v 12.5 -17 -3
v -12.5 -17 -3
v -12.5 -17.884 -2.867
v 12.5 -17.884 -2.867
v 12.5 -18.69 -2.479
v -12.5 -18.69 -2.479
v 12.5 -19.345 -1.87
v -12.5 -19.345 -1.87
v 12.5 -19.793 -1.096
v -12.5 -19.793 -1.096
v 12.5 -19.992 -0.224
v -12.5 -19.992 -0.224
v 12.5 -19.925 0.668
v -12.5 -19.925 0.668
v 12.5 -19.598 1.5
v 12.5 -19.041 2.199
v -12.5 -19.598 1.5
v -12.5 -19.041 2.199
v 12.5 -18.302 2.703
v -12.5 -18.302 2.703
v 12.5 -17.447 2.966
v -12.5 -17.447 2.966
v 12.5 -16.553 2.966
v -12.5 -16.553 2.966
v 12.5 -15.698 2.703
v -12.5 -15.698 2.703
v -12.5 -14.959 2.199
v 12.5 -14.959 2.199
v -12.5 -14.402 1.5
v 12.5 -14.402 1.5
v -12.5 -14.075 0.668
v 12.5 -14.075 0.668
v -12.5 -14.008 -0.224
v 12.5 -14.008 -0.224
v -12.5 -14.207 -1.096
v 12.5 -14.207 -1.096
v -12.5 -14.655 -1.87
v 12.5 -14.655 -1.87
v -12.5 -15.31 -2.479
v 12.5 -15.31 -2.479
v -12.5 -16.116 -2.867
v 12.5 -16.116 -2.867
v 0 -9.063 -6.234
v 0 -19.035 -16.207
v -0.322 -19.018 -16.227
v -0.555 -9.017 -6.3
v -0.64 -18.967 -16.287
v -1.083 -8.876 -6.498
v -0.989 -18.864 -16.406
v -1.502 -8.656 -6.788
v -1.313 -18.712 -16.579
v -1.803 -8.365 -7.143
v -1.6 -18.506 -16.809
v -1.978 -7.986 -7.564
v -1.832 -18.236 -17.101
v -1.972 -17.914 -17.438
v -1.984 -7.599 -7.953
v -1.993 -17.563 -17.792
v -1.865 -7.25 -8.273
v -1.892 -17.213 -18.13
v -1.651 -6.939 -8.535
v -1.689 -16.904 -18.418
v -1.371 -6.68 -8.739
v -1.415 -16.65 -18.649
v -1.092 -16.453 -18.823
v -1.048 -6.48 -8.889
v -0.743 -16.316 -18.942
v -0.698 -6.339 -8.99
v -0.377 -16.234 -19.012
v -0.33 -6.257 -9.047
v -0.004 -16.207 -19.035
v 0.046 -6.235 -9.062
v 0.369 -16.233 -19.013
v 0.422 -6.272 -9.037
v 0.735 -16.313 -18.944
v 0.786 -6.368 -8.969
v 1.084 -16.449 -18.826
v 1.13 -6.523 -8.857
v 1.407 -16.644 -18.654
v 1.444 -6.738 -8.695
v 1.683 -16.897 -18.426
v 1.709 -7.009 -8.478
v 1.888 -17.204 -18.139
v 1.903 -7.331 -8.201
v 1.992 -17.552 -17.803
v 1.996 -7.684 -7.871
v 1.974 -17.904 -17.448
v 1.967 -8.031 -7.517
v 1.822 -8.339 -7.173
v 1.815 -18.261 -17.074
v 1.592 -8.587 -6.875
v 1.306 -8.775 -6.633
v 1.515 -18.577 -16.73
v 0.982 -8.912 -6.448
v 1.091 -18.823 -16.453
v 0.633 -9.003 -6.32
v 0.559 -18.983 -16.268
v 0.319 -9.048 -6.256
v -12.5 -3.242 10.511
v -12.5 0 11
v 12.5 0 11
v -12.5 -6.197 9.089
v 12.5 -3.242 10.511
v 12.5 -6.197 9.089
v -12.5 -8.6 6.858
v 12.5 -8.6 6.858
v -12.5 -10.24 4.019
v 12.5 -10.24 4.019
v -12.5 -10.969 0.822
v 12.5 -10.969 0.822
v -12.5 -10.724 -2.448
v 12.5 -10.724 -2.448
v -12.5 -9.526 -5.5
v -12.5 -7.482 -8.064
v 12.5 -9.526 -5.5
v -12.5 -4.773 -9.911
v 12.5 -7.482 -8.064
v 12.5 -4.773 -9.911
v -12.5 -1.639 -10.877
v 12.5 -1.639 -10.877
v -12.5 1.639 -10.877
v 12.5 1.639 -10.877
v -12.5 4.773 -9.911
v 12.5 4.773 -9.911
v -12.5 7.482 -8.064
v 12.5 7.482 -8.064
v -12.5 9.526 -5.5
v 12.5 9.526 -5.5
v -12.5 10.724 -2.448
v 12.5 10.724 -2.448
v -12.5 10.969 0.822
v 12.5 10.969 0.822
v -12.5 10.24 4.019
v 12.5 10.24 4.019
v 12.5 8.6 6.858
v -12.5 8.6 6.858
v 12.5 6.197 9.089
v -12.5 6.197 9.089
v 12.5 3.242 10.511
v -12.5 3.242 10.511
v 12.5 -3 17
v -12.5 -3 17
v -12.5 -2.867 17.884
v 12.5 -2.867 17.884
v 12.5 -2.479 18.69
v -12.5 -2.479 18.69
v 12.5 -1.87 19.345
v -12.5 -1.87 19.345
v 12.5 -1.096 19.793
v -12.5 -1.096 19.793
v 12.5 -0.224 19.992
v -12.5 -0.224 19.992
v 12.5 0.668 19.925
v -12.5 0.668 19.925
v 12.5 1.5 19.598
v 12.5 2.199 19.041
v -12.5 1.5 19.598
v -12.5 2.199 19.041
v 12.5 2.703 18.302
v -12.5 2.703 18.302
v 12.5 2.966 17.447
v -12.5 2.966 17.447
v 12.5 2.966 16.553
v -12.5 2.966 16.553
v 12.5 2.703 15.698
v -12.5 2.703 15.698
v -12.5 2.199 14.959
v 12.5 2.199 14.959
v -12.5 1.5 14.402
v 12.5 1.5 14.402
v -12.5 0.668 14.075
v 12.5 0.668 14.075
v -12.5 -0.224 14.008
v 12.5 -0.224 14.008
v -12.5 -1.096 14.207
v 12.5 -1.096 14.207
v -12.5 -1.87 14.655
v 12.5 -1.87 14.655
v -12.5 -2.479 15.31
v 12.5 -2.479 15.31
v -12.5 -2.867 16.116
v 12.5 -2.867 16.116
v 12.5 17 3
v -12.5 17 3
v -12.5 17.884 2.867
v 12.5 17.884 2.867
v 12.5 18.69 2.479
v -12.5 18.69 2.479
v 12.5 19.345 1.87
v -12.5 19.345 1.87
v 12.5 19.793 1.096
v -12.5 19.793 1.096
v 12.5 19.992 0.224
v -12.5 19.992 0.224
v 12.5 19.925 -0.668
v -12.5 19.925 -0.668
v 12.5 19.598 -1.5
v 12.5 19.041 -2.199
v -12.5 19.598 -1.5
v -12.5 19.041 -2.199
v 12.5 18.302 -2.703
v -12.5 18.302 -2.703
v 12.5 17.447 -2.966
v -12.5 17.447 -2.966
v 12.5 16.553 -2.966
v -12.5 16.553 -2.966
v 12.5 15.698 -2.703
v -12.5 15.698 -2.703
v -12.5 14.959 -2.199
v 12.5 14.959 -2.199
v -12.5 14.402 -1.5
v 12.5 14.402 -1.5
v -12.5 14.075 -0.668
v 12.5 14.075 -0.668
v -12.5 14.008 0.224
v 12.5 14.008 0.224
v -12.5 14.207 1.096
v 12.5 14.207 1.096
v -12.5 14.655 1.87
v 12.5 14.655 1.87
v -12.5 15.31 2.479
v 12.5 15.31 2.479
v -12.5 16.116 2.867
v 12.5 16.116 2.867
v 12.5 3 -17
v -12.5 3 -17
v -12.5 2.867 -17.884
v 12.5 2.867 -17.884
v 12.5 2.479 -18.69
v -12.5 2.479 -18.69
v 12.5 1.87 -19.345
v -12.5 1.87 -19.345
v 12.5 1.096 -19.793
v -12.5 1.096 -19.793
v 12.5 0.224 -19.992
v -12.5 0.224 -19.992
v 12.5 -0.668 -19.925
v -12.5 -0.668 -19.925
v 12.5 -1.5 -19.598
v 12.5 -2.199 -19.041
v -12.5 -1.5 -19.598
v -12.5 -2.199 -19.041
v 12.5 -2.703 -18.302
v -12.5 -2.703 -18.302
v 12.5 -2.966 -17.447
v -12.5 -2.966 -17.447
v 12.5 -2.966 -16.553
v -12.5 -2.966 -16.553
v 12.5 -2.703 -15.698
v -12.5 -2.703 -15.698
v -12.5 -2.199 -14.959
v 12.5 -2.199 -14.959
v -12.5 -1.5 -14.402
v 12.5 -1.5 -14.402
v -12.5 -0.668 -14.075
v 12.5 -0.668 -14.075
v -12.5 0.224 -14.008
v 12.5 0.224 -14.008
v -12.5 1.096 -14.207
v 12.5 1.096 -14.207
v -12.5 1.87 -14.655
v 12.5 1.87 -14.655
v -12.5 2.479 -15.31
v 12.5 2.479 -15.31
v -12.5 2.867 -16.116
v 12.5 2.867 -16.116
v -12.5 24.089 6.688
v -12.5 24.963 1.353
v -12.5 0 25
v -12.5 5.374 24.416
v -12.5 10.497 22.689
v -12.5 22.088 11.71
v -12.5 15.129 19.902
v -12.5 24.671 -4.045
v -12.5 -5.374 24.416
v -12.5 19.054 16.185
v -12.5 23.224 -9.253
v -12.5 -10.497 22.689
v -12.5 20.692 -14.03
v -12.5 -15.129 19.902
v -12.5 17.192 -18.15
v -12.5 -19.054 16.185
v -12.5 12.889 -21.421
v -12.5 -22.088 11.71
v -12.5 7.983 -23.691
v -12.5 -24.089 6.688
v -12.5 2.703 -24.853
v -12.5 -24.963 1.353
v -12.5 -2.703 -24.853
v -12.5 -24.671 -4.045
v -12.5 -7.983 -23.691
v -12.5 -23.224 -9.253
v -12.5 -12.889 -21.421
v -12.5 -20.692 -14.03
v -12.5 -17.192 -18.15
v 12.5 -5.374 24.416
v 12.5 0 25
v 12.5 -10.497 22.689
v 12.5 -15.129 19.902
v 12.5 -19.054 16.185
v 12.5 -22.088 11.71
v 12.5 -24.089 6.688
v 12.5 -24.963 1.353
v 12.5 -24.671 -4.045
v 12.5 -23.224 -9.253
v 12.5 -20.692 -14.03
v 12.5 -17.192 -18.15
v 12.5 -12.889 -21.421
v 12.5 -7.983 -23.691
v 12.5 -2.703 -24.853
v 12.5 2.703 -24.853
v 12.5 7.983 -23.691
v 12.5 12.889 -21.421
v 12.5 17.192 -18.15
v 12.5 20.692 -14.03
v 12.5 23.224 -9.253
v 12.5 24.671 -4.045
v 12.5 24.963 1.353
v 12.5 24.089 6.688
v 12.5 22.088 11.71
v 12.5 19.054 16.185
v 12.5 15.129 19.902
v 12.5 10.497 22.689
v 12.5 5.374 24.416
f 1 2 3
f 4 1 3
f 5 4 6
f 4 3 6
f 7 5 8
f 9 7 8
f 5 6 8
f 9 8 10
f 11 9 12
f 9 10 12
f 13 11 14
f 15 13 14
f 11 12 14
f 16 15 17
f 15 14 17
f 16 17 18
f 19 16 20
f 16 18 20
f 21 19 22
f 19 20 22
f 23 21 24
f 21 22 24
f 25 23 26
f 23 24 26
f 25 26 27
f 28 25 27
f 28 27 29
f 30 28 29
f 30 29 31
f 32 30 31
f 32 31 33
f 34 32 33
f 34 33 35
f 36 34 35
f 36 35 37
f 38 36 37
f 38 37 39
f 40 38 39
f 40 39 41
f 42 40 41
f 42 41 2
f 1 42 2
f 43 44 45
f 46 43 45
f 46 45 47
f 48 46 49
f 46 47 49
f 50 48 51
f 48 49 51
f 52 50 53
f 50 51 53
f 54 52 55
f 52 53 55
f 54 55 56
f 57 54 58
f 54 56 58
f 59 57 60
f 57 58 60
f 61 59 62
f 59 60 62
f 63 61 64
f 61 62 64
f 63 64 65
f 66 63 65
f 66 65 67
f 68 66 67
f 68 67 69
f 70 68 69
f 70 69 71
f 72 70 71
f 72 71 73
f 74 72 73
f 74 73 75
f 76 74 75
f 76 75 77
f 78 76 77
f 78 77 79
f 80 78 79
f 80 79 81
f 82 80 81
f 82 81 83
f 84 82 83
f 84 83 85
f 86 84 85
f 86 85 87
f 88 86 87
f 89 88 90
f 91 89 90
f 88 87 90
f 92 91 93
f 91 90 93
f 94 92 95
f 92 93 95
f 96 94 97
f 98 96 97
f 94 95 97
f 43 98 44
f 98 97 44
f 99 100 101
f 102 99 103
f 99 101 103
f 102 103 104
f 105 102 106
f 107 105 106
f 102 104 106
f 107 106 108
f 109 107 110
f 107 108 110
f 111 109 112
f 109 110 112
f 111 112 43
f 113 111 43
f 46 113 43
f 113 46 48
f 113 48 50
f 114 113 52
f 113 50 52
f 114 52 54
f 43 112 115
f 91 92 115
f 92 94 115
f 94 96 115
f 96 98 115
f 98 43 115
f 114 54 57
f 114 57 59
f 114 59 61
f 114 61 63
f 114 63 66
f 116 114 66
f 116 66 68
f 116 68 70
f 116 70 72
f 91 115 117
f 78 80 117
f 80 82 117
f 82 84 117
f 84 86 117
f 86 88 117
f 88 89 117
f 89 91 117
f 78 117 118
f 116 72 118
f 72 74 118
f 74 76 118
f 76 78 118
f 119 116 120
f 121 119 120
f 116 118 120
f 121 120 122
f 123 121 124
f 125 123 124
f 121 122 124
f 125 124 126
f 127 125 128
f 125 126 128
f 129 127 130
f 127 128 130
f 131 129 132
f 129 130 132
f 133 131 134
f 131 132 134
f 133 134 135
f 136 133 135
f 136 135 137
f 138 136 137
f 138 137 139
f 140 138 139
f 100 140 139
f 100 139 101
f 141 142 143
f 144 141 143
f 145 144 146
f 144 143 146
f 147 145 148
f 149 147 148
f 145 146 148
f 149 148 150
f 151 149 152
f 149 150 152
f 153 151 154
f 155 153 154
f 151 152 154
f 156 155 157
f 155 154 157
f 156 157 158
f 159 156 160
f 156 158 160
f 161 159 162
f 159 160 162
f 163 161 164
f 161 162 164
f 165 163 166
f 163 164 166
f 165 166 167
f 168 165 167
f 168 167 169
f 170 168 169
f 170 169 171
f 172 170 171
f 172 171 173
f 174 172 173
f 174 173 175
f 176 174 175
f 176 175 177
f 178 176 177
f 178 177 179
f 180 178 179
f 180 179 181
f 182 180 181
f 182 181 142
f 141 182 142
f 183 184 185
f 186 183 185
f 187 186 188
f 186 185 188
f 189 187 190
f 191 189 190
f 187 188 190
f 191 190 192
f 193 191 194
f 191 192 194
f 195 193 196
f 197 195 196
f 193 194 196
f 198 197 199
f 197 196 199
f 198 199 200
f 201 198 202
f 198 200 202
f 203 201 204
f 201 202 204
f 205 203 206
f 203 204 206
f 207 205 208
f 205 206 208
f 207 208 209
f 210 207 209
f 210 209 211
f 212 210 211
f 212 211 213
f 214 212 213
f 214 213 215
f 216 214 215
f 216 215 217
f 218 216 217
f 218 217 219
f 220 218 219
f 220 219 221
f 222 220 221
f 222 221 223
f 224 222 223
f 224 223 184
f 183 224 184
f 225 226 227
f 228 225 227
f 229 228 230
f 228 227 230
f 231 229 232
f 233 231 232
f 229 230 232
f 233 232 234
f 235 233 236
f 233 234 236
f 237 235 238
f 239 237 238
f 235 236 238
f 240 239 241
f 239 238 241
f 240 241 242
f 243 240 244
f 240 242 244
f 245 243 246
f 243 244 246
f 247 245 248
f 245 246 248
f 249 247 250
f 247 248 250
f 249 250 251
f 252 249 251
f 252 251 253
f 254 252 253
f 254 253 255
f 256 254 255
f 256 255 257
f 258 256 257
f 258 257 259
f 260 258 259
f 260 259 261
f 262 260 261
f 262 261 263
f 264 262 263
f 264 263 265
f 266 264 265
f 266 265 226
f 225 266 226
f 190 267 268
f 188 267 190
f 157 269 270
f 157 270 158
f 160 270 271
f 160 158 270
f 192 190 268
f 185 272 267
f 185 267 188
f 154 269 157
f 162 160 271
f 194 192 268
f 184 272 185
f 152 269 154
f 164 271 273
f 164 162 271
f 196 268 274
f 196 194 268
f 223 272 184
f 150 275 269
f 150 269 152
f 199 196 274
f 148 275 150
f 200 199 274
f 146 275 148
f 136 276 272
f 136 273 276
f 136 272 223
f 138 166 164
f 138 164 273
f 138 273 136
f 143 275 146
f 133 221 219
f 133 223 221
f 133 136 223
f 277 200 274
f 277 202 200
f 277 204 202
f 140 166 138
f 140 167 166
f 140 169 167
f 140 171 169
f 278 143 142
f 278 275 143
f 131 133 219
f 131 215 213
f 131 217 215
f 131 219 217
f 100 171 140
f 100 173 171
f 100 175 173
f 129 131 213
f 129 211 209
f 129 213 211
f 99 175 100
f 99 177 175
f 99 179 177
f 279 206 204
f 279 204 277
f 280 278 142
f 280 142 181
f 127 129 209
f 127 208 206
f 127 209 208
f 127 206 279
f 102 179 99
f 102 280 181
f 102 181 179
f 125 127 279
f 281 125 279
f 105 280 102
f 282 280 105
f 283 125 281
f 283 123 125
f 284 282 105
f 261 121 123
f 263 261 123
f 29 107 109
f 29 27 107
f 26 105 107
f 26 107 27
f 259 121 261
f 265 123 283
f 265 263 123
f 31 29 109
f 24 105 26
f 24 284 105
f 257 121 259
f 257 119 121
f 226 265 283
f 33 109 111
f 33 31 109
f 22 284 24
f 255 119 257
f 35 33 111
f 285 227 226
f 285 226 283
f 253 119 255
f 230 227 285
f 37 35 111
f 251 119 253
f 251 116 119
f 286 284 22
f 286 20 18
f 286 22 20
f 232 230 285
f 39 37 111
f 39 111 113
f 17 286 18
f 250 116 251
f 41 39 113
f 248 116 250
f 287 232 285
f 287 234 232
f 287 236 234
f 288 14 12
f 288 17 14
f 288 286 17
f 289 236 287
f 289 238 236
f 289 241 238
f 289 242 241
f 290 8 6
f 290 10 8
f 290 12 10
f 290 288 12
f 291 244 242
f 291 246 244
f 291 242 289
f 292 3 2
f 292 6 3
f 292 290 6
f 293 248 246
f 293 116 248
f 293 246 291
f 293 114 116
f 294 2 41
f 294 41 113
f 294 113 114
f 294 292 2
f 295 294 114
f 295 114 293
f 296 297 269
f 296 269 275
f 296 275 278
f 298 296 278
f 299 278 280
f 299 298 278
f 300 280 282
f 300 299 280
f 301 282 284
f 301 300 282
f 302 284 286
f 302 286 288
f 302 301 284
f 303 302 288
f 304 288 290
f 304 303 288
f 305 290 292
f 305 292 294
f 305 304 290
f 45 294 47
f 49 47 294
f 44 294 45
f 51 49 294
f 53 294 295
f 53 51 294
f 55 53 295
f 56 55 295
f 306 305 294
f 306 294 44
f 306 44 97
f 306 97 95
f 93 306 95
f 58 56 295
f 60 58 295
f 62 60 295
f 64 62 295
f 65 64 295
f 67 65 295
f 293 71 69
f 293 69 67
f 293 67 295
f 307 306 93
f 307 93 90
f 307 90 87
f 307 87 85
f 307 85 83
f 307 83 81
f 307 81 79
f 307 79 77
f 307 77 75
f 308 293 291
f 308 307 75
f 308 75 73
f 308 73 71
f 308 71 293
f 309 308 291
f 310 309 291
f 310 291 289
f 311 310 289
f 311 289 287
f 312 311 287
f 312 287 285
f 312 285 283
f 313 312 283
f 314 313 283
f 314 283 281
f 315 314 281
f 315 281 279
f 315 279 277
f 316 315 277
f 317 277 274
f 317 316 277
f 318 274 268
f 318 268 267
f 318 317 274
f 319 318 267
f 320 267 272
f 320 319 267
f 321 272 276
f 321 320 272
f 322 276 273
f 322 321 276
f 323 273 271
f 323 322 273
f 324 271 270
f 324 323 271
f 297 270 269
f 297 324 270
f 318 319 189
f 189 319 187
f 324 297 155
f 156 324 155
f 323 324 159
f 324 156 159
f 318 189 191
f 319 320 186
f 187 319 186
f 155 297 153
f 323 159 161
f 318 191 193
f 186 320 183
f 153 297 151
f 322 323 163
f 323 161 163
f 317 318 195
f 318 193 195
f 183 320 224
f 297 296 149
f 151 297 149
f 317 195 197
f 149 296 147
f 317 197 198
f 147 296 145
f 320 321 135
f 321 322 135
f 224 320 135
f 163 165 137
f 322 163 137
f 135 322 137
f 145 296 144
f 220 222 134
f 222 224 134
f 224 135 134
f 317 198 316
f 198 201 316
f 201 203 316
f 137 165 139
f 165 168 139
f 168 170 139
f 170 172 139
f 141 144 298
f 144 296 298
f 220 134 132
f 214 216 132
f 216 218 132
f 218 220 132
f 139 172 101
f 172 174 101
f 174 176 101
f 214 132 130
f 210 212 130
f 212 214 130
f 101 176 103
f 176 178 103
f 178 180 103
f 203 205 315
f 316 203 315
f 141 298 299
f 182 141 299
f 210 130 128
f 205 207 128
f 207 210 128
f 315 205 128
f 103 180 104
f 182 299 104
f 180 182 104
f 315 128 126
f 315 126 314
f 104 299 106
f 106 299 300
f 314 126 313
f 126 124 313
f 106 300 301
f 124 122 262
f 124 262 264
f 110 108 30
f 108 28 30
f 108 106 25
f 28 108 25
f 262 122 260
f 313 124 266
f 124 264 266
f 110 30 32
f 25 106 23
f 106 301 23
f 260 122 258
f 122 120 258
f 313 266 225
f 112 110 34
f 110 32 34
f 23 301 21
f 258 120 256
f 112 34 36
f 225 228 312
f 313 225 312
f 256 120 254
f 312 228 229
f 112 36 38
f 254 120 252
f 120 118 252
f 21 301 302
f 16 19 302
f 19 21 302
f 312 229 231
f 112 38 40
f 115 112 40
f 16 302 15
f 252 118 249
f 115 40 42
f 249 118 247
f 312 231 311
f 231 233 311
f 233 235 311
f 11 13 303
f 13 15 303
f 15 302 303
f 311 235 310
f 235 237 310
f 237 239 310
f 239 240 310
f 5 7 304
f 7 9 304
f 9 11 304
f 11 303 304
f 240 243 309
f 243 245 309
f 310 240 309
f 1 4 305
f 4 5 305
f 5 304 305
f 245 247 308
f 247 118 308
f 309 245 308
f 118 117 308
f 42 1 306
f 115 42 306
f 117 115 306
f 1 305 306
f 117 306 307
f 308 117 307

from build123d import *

# Parameters (mm, degrees)
SKETCH1_W                  = 25
SKETCH1_H                  = 14
F_6_0MM_DOWEL_HOLE1_D      = 6
CIRPATTERN1_COUNT          = 4
F_4_0MM_DOWEL_HOLE1_REACH  = 63.636
F_4_0MM_DOWEL_HOLE1_BORE_R = 2


with BuildPart() as part:
    # Sketch1 → Revolve2 (revolve)
    with BuildSketch(Plane(origin=(0, 0, 0), x_dir=(1, 0, 0), z_dir=(0, 1, 0)), mode=Mode.PRIVATE) as revolve2_sk:
        with Locations((0, 18)):
            Rectangle(SKETCH1_W, SKETCH1_H)
    revolve(revolve2_sk.sketch.rotate(Axis((-25.731009954, 0, 0), (1, 0, 0)), 180), axis=Axis((-25.731009954, 0, 0), (1, 0, 0)))

    # Ø6.0mm Dowel Hole1 (through all)
    with Locations(Plane(origin=(12.5, 0, 0), x_dir=(0, 0, -1), z_dir=(1, 0, 0))):
        with Locations((0, 17)):
            f_6_0mm_dowel_hole1 = Hole(F_6_0MM_DOWEL_HOLE1_D / 2)

    # CirPattern1: Ø6.0mm Dowel Hole1 ×4 about axis
    cirpattern1_axis = Axis((0, 0, 0), (1, 0, 0))
    for i in range(1, CIRPATTERN1_COUNT):
        add(f_6_0mm_dowel_hole1.rotate(cirpattern1_axis, i * 360 / CIRPATTERN1_COUNT), mode=Mode.SUBTRACT)

    # Ø4.0mm Dowel Hole1 bore (on position points) → Ø4.0mm Dowel Hole1 (cut, up to next)
    with BuildSketch(Plane(origin=(0, -17.677561289, -17.67777777), x_dir=(0, -0.7071111108, 0.707102451547), z_dir=(0, -0.707102451547, -0.7071111108)), mode=Mode.PRIVATE) as f_4_0mm_dowel_hole1_sk1:
        Circle(F_4_0MM_DOWEL_HOLE1_BORE_R)
    f_4_0mm_dowel_hole1_tool1 = extrude(f_4_0mm_dowel_hole1_sk1.sketch, amount=-F_4_0MM_DOWEL_HOLE1_REACH, mode=Mode.PRIVATE) & part.part
    add(f_4_0mm_dowel_hole1_tool1.solids().sort_by_distance((0, -17.677561, -17.677778))[0], mode=Mode.SUBTRACT)


solid = part.part
